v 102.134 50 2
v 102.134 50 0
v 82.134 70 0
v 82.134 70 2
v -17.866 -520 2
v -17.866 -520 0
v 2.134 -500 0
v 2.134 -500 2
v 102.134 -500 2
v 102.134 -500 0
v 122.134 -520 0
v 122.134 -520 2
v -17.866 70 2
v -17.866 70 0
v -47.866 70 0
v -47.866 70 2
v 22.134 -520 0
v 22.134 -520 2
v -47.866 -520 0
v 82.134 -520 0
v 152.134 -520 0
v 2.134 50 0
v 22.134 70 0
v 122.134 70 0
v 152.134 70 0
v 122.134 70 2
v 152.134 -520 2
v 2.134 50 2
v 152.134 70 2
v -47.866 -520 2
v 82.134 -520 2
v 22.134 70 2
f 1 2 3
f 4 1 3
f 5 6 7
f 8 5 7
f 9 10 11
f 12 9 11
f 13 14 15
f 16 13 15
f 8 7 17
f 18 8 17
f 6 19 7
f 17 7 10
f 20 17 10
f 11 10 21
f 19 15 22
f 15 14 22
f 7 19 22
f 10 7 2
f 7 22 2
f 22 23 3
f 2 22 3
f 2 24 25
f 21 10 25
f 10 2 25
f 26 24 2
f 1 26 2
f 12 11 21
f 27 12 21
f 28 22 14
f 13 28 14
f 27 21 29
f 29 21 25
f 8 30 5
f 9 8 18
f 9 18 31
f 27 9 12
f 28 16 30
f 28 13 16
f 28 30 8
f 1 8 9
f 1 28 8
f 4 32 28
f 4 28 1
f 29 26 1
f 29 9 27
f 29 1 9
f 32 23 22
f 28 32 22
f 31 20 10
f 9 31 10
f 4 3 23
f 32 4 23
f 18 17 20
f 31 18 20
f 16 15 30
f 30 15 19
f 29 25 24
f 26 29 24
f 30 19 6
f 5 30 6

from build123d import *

# Parameters (mm, degrees)
F0_W     = 200
F0_H     = 450
F1_DEPTH = 2


with BuildPart() as f1:
    # F0 (on Top) → F1 (new body)
    with BuildSketch(Plane.XY):
        Polygon((-47.865819, 70), (-47.865819, 0), (152.134181, 0), (152.134181, 70), (122.134181, 70), (102.134181, 50), (82.134181, 70), (22.134181, 70), (2.134181, 50), (-17.865819, 70), align=None)
        with Locations((52.134181, -225)):
            Rectangle(F0_W, F0_H)
        Polygon((152.134181, -450), (-47.865819, -450), (-47.865819, -520), (-17.865819, -520), (2.134181, -500), (22.134181, -520), (82.134181, -520), (102.134181, -500), (122.134181, -520), (152.134181, -520), align=None)
    extrude(amount=F1_DEPTH)


solid = f1.part
